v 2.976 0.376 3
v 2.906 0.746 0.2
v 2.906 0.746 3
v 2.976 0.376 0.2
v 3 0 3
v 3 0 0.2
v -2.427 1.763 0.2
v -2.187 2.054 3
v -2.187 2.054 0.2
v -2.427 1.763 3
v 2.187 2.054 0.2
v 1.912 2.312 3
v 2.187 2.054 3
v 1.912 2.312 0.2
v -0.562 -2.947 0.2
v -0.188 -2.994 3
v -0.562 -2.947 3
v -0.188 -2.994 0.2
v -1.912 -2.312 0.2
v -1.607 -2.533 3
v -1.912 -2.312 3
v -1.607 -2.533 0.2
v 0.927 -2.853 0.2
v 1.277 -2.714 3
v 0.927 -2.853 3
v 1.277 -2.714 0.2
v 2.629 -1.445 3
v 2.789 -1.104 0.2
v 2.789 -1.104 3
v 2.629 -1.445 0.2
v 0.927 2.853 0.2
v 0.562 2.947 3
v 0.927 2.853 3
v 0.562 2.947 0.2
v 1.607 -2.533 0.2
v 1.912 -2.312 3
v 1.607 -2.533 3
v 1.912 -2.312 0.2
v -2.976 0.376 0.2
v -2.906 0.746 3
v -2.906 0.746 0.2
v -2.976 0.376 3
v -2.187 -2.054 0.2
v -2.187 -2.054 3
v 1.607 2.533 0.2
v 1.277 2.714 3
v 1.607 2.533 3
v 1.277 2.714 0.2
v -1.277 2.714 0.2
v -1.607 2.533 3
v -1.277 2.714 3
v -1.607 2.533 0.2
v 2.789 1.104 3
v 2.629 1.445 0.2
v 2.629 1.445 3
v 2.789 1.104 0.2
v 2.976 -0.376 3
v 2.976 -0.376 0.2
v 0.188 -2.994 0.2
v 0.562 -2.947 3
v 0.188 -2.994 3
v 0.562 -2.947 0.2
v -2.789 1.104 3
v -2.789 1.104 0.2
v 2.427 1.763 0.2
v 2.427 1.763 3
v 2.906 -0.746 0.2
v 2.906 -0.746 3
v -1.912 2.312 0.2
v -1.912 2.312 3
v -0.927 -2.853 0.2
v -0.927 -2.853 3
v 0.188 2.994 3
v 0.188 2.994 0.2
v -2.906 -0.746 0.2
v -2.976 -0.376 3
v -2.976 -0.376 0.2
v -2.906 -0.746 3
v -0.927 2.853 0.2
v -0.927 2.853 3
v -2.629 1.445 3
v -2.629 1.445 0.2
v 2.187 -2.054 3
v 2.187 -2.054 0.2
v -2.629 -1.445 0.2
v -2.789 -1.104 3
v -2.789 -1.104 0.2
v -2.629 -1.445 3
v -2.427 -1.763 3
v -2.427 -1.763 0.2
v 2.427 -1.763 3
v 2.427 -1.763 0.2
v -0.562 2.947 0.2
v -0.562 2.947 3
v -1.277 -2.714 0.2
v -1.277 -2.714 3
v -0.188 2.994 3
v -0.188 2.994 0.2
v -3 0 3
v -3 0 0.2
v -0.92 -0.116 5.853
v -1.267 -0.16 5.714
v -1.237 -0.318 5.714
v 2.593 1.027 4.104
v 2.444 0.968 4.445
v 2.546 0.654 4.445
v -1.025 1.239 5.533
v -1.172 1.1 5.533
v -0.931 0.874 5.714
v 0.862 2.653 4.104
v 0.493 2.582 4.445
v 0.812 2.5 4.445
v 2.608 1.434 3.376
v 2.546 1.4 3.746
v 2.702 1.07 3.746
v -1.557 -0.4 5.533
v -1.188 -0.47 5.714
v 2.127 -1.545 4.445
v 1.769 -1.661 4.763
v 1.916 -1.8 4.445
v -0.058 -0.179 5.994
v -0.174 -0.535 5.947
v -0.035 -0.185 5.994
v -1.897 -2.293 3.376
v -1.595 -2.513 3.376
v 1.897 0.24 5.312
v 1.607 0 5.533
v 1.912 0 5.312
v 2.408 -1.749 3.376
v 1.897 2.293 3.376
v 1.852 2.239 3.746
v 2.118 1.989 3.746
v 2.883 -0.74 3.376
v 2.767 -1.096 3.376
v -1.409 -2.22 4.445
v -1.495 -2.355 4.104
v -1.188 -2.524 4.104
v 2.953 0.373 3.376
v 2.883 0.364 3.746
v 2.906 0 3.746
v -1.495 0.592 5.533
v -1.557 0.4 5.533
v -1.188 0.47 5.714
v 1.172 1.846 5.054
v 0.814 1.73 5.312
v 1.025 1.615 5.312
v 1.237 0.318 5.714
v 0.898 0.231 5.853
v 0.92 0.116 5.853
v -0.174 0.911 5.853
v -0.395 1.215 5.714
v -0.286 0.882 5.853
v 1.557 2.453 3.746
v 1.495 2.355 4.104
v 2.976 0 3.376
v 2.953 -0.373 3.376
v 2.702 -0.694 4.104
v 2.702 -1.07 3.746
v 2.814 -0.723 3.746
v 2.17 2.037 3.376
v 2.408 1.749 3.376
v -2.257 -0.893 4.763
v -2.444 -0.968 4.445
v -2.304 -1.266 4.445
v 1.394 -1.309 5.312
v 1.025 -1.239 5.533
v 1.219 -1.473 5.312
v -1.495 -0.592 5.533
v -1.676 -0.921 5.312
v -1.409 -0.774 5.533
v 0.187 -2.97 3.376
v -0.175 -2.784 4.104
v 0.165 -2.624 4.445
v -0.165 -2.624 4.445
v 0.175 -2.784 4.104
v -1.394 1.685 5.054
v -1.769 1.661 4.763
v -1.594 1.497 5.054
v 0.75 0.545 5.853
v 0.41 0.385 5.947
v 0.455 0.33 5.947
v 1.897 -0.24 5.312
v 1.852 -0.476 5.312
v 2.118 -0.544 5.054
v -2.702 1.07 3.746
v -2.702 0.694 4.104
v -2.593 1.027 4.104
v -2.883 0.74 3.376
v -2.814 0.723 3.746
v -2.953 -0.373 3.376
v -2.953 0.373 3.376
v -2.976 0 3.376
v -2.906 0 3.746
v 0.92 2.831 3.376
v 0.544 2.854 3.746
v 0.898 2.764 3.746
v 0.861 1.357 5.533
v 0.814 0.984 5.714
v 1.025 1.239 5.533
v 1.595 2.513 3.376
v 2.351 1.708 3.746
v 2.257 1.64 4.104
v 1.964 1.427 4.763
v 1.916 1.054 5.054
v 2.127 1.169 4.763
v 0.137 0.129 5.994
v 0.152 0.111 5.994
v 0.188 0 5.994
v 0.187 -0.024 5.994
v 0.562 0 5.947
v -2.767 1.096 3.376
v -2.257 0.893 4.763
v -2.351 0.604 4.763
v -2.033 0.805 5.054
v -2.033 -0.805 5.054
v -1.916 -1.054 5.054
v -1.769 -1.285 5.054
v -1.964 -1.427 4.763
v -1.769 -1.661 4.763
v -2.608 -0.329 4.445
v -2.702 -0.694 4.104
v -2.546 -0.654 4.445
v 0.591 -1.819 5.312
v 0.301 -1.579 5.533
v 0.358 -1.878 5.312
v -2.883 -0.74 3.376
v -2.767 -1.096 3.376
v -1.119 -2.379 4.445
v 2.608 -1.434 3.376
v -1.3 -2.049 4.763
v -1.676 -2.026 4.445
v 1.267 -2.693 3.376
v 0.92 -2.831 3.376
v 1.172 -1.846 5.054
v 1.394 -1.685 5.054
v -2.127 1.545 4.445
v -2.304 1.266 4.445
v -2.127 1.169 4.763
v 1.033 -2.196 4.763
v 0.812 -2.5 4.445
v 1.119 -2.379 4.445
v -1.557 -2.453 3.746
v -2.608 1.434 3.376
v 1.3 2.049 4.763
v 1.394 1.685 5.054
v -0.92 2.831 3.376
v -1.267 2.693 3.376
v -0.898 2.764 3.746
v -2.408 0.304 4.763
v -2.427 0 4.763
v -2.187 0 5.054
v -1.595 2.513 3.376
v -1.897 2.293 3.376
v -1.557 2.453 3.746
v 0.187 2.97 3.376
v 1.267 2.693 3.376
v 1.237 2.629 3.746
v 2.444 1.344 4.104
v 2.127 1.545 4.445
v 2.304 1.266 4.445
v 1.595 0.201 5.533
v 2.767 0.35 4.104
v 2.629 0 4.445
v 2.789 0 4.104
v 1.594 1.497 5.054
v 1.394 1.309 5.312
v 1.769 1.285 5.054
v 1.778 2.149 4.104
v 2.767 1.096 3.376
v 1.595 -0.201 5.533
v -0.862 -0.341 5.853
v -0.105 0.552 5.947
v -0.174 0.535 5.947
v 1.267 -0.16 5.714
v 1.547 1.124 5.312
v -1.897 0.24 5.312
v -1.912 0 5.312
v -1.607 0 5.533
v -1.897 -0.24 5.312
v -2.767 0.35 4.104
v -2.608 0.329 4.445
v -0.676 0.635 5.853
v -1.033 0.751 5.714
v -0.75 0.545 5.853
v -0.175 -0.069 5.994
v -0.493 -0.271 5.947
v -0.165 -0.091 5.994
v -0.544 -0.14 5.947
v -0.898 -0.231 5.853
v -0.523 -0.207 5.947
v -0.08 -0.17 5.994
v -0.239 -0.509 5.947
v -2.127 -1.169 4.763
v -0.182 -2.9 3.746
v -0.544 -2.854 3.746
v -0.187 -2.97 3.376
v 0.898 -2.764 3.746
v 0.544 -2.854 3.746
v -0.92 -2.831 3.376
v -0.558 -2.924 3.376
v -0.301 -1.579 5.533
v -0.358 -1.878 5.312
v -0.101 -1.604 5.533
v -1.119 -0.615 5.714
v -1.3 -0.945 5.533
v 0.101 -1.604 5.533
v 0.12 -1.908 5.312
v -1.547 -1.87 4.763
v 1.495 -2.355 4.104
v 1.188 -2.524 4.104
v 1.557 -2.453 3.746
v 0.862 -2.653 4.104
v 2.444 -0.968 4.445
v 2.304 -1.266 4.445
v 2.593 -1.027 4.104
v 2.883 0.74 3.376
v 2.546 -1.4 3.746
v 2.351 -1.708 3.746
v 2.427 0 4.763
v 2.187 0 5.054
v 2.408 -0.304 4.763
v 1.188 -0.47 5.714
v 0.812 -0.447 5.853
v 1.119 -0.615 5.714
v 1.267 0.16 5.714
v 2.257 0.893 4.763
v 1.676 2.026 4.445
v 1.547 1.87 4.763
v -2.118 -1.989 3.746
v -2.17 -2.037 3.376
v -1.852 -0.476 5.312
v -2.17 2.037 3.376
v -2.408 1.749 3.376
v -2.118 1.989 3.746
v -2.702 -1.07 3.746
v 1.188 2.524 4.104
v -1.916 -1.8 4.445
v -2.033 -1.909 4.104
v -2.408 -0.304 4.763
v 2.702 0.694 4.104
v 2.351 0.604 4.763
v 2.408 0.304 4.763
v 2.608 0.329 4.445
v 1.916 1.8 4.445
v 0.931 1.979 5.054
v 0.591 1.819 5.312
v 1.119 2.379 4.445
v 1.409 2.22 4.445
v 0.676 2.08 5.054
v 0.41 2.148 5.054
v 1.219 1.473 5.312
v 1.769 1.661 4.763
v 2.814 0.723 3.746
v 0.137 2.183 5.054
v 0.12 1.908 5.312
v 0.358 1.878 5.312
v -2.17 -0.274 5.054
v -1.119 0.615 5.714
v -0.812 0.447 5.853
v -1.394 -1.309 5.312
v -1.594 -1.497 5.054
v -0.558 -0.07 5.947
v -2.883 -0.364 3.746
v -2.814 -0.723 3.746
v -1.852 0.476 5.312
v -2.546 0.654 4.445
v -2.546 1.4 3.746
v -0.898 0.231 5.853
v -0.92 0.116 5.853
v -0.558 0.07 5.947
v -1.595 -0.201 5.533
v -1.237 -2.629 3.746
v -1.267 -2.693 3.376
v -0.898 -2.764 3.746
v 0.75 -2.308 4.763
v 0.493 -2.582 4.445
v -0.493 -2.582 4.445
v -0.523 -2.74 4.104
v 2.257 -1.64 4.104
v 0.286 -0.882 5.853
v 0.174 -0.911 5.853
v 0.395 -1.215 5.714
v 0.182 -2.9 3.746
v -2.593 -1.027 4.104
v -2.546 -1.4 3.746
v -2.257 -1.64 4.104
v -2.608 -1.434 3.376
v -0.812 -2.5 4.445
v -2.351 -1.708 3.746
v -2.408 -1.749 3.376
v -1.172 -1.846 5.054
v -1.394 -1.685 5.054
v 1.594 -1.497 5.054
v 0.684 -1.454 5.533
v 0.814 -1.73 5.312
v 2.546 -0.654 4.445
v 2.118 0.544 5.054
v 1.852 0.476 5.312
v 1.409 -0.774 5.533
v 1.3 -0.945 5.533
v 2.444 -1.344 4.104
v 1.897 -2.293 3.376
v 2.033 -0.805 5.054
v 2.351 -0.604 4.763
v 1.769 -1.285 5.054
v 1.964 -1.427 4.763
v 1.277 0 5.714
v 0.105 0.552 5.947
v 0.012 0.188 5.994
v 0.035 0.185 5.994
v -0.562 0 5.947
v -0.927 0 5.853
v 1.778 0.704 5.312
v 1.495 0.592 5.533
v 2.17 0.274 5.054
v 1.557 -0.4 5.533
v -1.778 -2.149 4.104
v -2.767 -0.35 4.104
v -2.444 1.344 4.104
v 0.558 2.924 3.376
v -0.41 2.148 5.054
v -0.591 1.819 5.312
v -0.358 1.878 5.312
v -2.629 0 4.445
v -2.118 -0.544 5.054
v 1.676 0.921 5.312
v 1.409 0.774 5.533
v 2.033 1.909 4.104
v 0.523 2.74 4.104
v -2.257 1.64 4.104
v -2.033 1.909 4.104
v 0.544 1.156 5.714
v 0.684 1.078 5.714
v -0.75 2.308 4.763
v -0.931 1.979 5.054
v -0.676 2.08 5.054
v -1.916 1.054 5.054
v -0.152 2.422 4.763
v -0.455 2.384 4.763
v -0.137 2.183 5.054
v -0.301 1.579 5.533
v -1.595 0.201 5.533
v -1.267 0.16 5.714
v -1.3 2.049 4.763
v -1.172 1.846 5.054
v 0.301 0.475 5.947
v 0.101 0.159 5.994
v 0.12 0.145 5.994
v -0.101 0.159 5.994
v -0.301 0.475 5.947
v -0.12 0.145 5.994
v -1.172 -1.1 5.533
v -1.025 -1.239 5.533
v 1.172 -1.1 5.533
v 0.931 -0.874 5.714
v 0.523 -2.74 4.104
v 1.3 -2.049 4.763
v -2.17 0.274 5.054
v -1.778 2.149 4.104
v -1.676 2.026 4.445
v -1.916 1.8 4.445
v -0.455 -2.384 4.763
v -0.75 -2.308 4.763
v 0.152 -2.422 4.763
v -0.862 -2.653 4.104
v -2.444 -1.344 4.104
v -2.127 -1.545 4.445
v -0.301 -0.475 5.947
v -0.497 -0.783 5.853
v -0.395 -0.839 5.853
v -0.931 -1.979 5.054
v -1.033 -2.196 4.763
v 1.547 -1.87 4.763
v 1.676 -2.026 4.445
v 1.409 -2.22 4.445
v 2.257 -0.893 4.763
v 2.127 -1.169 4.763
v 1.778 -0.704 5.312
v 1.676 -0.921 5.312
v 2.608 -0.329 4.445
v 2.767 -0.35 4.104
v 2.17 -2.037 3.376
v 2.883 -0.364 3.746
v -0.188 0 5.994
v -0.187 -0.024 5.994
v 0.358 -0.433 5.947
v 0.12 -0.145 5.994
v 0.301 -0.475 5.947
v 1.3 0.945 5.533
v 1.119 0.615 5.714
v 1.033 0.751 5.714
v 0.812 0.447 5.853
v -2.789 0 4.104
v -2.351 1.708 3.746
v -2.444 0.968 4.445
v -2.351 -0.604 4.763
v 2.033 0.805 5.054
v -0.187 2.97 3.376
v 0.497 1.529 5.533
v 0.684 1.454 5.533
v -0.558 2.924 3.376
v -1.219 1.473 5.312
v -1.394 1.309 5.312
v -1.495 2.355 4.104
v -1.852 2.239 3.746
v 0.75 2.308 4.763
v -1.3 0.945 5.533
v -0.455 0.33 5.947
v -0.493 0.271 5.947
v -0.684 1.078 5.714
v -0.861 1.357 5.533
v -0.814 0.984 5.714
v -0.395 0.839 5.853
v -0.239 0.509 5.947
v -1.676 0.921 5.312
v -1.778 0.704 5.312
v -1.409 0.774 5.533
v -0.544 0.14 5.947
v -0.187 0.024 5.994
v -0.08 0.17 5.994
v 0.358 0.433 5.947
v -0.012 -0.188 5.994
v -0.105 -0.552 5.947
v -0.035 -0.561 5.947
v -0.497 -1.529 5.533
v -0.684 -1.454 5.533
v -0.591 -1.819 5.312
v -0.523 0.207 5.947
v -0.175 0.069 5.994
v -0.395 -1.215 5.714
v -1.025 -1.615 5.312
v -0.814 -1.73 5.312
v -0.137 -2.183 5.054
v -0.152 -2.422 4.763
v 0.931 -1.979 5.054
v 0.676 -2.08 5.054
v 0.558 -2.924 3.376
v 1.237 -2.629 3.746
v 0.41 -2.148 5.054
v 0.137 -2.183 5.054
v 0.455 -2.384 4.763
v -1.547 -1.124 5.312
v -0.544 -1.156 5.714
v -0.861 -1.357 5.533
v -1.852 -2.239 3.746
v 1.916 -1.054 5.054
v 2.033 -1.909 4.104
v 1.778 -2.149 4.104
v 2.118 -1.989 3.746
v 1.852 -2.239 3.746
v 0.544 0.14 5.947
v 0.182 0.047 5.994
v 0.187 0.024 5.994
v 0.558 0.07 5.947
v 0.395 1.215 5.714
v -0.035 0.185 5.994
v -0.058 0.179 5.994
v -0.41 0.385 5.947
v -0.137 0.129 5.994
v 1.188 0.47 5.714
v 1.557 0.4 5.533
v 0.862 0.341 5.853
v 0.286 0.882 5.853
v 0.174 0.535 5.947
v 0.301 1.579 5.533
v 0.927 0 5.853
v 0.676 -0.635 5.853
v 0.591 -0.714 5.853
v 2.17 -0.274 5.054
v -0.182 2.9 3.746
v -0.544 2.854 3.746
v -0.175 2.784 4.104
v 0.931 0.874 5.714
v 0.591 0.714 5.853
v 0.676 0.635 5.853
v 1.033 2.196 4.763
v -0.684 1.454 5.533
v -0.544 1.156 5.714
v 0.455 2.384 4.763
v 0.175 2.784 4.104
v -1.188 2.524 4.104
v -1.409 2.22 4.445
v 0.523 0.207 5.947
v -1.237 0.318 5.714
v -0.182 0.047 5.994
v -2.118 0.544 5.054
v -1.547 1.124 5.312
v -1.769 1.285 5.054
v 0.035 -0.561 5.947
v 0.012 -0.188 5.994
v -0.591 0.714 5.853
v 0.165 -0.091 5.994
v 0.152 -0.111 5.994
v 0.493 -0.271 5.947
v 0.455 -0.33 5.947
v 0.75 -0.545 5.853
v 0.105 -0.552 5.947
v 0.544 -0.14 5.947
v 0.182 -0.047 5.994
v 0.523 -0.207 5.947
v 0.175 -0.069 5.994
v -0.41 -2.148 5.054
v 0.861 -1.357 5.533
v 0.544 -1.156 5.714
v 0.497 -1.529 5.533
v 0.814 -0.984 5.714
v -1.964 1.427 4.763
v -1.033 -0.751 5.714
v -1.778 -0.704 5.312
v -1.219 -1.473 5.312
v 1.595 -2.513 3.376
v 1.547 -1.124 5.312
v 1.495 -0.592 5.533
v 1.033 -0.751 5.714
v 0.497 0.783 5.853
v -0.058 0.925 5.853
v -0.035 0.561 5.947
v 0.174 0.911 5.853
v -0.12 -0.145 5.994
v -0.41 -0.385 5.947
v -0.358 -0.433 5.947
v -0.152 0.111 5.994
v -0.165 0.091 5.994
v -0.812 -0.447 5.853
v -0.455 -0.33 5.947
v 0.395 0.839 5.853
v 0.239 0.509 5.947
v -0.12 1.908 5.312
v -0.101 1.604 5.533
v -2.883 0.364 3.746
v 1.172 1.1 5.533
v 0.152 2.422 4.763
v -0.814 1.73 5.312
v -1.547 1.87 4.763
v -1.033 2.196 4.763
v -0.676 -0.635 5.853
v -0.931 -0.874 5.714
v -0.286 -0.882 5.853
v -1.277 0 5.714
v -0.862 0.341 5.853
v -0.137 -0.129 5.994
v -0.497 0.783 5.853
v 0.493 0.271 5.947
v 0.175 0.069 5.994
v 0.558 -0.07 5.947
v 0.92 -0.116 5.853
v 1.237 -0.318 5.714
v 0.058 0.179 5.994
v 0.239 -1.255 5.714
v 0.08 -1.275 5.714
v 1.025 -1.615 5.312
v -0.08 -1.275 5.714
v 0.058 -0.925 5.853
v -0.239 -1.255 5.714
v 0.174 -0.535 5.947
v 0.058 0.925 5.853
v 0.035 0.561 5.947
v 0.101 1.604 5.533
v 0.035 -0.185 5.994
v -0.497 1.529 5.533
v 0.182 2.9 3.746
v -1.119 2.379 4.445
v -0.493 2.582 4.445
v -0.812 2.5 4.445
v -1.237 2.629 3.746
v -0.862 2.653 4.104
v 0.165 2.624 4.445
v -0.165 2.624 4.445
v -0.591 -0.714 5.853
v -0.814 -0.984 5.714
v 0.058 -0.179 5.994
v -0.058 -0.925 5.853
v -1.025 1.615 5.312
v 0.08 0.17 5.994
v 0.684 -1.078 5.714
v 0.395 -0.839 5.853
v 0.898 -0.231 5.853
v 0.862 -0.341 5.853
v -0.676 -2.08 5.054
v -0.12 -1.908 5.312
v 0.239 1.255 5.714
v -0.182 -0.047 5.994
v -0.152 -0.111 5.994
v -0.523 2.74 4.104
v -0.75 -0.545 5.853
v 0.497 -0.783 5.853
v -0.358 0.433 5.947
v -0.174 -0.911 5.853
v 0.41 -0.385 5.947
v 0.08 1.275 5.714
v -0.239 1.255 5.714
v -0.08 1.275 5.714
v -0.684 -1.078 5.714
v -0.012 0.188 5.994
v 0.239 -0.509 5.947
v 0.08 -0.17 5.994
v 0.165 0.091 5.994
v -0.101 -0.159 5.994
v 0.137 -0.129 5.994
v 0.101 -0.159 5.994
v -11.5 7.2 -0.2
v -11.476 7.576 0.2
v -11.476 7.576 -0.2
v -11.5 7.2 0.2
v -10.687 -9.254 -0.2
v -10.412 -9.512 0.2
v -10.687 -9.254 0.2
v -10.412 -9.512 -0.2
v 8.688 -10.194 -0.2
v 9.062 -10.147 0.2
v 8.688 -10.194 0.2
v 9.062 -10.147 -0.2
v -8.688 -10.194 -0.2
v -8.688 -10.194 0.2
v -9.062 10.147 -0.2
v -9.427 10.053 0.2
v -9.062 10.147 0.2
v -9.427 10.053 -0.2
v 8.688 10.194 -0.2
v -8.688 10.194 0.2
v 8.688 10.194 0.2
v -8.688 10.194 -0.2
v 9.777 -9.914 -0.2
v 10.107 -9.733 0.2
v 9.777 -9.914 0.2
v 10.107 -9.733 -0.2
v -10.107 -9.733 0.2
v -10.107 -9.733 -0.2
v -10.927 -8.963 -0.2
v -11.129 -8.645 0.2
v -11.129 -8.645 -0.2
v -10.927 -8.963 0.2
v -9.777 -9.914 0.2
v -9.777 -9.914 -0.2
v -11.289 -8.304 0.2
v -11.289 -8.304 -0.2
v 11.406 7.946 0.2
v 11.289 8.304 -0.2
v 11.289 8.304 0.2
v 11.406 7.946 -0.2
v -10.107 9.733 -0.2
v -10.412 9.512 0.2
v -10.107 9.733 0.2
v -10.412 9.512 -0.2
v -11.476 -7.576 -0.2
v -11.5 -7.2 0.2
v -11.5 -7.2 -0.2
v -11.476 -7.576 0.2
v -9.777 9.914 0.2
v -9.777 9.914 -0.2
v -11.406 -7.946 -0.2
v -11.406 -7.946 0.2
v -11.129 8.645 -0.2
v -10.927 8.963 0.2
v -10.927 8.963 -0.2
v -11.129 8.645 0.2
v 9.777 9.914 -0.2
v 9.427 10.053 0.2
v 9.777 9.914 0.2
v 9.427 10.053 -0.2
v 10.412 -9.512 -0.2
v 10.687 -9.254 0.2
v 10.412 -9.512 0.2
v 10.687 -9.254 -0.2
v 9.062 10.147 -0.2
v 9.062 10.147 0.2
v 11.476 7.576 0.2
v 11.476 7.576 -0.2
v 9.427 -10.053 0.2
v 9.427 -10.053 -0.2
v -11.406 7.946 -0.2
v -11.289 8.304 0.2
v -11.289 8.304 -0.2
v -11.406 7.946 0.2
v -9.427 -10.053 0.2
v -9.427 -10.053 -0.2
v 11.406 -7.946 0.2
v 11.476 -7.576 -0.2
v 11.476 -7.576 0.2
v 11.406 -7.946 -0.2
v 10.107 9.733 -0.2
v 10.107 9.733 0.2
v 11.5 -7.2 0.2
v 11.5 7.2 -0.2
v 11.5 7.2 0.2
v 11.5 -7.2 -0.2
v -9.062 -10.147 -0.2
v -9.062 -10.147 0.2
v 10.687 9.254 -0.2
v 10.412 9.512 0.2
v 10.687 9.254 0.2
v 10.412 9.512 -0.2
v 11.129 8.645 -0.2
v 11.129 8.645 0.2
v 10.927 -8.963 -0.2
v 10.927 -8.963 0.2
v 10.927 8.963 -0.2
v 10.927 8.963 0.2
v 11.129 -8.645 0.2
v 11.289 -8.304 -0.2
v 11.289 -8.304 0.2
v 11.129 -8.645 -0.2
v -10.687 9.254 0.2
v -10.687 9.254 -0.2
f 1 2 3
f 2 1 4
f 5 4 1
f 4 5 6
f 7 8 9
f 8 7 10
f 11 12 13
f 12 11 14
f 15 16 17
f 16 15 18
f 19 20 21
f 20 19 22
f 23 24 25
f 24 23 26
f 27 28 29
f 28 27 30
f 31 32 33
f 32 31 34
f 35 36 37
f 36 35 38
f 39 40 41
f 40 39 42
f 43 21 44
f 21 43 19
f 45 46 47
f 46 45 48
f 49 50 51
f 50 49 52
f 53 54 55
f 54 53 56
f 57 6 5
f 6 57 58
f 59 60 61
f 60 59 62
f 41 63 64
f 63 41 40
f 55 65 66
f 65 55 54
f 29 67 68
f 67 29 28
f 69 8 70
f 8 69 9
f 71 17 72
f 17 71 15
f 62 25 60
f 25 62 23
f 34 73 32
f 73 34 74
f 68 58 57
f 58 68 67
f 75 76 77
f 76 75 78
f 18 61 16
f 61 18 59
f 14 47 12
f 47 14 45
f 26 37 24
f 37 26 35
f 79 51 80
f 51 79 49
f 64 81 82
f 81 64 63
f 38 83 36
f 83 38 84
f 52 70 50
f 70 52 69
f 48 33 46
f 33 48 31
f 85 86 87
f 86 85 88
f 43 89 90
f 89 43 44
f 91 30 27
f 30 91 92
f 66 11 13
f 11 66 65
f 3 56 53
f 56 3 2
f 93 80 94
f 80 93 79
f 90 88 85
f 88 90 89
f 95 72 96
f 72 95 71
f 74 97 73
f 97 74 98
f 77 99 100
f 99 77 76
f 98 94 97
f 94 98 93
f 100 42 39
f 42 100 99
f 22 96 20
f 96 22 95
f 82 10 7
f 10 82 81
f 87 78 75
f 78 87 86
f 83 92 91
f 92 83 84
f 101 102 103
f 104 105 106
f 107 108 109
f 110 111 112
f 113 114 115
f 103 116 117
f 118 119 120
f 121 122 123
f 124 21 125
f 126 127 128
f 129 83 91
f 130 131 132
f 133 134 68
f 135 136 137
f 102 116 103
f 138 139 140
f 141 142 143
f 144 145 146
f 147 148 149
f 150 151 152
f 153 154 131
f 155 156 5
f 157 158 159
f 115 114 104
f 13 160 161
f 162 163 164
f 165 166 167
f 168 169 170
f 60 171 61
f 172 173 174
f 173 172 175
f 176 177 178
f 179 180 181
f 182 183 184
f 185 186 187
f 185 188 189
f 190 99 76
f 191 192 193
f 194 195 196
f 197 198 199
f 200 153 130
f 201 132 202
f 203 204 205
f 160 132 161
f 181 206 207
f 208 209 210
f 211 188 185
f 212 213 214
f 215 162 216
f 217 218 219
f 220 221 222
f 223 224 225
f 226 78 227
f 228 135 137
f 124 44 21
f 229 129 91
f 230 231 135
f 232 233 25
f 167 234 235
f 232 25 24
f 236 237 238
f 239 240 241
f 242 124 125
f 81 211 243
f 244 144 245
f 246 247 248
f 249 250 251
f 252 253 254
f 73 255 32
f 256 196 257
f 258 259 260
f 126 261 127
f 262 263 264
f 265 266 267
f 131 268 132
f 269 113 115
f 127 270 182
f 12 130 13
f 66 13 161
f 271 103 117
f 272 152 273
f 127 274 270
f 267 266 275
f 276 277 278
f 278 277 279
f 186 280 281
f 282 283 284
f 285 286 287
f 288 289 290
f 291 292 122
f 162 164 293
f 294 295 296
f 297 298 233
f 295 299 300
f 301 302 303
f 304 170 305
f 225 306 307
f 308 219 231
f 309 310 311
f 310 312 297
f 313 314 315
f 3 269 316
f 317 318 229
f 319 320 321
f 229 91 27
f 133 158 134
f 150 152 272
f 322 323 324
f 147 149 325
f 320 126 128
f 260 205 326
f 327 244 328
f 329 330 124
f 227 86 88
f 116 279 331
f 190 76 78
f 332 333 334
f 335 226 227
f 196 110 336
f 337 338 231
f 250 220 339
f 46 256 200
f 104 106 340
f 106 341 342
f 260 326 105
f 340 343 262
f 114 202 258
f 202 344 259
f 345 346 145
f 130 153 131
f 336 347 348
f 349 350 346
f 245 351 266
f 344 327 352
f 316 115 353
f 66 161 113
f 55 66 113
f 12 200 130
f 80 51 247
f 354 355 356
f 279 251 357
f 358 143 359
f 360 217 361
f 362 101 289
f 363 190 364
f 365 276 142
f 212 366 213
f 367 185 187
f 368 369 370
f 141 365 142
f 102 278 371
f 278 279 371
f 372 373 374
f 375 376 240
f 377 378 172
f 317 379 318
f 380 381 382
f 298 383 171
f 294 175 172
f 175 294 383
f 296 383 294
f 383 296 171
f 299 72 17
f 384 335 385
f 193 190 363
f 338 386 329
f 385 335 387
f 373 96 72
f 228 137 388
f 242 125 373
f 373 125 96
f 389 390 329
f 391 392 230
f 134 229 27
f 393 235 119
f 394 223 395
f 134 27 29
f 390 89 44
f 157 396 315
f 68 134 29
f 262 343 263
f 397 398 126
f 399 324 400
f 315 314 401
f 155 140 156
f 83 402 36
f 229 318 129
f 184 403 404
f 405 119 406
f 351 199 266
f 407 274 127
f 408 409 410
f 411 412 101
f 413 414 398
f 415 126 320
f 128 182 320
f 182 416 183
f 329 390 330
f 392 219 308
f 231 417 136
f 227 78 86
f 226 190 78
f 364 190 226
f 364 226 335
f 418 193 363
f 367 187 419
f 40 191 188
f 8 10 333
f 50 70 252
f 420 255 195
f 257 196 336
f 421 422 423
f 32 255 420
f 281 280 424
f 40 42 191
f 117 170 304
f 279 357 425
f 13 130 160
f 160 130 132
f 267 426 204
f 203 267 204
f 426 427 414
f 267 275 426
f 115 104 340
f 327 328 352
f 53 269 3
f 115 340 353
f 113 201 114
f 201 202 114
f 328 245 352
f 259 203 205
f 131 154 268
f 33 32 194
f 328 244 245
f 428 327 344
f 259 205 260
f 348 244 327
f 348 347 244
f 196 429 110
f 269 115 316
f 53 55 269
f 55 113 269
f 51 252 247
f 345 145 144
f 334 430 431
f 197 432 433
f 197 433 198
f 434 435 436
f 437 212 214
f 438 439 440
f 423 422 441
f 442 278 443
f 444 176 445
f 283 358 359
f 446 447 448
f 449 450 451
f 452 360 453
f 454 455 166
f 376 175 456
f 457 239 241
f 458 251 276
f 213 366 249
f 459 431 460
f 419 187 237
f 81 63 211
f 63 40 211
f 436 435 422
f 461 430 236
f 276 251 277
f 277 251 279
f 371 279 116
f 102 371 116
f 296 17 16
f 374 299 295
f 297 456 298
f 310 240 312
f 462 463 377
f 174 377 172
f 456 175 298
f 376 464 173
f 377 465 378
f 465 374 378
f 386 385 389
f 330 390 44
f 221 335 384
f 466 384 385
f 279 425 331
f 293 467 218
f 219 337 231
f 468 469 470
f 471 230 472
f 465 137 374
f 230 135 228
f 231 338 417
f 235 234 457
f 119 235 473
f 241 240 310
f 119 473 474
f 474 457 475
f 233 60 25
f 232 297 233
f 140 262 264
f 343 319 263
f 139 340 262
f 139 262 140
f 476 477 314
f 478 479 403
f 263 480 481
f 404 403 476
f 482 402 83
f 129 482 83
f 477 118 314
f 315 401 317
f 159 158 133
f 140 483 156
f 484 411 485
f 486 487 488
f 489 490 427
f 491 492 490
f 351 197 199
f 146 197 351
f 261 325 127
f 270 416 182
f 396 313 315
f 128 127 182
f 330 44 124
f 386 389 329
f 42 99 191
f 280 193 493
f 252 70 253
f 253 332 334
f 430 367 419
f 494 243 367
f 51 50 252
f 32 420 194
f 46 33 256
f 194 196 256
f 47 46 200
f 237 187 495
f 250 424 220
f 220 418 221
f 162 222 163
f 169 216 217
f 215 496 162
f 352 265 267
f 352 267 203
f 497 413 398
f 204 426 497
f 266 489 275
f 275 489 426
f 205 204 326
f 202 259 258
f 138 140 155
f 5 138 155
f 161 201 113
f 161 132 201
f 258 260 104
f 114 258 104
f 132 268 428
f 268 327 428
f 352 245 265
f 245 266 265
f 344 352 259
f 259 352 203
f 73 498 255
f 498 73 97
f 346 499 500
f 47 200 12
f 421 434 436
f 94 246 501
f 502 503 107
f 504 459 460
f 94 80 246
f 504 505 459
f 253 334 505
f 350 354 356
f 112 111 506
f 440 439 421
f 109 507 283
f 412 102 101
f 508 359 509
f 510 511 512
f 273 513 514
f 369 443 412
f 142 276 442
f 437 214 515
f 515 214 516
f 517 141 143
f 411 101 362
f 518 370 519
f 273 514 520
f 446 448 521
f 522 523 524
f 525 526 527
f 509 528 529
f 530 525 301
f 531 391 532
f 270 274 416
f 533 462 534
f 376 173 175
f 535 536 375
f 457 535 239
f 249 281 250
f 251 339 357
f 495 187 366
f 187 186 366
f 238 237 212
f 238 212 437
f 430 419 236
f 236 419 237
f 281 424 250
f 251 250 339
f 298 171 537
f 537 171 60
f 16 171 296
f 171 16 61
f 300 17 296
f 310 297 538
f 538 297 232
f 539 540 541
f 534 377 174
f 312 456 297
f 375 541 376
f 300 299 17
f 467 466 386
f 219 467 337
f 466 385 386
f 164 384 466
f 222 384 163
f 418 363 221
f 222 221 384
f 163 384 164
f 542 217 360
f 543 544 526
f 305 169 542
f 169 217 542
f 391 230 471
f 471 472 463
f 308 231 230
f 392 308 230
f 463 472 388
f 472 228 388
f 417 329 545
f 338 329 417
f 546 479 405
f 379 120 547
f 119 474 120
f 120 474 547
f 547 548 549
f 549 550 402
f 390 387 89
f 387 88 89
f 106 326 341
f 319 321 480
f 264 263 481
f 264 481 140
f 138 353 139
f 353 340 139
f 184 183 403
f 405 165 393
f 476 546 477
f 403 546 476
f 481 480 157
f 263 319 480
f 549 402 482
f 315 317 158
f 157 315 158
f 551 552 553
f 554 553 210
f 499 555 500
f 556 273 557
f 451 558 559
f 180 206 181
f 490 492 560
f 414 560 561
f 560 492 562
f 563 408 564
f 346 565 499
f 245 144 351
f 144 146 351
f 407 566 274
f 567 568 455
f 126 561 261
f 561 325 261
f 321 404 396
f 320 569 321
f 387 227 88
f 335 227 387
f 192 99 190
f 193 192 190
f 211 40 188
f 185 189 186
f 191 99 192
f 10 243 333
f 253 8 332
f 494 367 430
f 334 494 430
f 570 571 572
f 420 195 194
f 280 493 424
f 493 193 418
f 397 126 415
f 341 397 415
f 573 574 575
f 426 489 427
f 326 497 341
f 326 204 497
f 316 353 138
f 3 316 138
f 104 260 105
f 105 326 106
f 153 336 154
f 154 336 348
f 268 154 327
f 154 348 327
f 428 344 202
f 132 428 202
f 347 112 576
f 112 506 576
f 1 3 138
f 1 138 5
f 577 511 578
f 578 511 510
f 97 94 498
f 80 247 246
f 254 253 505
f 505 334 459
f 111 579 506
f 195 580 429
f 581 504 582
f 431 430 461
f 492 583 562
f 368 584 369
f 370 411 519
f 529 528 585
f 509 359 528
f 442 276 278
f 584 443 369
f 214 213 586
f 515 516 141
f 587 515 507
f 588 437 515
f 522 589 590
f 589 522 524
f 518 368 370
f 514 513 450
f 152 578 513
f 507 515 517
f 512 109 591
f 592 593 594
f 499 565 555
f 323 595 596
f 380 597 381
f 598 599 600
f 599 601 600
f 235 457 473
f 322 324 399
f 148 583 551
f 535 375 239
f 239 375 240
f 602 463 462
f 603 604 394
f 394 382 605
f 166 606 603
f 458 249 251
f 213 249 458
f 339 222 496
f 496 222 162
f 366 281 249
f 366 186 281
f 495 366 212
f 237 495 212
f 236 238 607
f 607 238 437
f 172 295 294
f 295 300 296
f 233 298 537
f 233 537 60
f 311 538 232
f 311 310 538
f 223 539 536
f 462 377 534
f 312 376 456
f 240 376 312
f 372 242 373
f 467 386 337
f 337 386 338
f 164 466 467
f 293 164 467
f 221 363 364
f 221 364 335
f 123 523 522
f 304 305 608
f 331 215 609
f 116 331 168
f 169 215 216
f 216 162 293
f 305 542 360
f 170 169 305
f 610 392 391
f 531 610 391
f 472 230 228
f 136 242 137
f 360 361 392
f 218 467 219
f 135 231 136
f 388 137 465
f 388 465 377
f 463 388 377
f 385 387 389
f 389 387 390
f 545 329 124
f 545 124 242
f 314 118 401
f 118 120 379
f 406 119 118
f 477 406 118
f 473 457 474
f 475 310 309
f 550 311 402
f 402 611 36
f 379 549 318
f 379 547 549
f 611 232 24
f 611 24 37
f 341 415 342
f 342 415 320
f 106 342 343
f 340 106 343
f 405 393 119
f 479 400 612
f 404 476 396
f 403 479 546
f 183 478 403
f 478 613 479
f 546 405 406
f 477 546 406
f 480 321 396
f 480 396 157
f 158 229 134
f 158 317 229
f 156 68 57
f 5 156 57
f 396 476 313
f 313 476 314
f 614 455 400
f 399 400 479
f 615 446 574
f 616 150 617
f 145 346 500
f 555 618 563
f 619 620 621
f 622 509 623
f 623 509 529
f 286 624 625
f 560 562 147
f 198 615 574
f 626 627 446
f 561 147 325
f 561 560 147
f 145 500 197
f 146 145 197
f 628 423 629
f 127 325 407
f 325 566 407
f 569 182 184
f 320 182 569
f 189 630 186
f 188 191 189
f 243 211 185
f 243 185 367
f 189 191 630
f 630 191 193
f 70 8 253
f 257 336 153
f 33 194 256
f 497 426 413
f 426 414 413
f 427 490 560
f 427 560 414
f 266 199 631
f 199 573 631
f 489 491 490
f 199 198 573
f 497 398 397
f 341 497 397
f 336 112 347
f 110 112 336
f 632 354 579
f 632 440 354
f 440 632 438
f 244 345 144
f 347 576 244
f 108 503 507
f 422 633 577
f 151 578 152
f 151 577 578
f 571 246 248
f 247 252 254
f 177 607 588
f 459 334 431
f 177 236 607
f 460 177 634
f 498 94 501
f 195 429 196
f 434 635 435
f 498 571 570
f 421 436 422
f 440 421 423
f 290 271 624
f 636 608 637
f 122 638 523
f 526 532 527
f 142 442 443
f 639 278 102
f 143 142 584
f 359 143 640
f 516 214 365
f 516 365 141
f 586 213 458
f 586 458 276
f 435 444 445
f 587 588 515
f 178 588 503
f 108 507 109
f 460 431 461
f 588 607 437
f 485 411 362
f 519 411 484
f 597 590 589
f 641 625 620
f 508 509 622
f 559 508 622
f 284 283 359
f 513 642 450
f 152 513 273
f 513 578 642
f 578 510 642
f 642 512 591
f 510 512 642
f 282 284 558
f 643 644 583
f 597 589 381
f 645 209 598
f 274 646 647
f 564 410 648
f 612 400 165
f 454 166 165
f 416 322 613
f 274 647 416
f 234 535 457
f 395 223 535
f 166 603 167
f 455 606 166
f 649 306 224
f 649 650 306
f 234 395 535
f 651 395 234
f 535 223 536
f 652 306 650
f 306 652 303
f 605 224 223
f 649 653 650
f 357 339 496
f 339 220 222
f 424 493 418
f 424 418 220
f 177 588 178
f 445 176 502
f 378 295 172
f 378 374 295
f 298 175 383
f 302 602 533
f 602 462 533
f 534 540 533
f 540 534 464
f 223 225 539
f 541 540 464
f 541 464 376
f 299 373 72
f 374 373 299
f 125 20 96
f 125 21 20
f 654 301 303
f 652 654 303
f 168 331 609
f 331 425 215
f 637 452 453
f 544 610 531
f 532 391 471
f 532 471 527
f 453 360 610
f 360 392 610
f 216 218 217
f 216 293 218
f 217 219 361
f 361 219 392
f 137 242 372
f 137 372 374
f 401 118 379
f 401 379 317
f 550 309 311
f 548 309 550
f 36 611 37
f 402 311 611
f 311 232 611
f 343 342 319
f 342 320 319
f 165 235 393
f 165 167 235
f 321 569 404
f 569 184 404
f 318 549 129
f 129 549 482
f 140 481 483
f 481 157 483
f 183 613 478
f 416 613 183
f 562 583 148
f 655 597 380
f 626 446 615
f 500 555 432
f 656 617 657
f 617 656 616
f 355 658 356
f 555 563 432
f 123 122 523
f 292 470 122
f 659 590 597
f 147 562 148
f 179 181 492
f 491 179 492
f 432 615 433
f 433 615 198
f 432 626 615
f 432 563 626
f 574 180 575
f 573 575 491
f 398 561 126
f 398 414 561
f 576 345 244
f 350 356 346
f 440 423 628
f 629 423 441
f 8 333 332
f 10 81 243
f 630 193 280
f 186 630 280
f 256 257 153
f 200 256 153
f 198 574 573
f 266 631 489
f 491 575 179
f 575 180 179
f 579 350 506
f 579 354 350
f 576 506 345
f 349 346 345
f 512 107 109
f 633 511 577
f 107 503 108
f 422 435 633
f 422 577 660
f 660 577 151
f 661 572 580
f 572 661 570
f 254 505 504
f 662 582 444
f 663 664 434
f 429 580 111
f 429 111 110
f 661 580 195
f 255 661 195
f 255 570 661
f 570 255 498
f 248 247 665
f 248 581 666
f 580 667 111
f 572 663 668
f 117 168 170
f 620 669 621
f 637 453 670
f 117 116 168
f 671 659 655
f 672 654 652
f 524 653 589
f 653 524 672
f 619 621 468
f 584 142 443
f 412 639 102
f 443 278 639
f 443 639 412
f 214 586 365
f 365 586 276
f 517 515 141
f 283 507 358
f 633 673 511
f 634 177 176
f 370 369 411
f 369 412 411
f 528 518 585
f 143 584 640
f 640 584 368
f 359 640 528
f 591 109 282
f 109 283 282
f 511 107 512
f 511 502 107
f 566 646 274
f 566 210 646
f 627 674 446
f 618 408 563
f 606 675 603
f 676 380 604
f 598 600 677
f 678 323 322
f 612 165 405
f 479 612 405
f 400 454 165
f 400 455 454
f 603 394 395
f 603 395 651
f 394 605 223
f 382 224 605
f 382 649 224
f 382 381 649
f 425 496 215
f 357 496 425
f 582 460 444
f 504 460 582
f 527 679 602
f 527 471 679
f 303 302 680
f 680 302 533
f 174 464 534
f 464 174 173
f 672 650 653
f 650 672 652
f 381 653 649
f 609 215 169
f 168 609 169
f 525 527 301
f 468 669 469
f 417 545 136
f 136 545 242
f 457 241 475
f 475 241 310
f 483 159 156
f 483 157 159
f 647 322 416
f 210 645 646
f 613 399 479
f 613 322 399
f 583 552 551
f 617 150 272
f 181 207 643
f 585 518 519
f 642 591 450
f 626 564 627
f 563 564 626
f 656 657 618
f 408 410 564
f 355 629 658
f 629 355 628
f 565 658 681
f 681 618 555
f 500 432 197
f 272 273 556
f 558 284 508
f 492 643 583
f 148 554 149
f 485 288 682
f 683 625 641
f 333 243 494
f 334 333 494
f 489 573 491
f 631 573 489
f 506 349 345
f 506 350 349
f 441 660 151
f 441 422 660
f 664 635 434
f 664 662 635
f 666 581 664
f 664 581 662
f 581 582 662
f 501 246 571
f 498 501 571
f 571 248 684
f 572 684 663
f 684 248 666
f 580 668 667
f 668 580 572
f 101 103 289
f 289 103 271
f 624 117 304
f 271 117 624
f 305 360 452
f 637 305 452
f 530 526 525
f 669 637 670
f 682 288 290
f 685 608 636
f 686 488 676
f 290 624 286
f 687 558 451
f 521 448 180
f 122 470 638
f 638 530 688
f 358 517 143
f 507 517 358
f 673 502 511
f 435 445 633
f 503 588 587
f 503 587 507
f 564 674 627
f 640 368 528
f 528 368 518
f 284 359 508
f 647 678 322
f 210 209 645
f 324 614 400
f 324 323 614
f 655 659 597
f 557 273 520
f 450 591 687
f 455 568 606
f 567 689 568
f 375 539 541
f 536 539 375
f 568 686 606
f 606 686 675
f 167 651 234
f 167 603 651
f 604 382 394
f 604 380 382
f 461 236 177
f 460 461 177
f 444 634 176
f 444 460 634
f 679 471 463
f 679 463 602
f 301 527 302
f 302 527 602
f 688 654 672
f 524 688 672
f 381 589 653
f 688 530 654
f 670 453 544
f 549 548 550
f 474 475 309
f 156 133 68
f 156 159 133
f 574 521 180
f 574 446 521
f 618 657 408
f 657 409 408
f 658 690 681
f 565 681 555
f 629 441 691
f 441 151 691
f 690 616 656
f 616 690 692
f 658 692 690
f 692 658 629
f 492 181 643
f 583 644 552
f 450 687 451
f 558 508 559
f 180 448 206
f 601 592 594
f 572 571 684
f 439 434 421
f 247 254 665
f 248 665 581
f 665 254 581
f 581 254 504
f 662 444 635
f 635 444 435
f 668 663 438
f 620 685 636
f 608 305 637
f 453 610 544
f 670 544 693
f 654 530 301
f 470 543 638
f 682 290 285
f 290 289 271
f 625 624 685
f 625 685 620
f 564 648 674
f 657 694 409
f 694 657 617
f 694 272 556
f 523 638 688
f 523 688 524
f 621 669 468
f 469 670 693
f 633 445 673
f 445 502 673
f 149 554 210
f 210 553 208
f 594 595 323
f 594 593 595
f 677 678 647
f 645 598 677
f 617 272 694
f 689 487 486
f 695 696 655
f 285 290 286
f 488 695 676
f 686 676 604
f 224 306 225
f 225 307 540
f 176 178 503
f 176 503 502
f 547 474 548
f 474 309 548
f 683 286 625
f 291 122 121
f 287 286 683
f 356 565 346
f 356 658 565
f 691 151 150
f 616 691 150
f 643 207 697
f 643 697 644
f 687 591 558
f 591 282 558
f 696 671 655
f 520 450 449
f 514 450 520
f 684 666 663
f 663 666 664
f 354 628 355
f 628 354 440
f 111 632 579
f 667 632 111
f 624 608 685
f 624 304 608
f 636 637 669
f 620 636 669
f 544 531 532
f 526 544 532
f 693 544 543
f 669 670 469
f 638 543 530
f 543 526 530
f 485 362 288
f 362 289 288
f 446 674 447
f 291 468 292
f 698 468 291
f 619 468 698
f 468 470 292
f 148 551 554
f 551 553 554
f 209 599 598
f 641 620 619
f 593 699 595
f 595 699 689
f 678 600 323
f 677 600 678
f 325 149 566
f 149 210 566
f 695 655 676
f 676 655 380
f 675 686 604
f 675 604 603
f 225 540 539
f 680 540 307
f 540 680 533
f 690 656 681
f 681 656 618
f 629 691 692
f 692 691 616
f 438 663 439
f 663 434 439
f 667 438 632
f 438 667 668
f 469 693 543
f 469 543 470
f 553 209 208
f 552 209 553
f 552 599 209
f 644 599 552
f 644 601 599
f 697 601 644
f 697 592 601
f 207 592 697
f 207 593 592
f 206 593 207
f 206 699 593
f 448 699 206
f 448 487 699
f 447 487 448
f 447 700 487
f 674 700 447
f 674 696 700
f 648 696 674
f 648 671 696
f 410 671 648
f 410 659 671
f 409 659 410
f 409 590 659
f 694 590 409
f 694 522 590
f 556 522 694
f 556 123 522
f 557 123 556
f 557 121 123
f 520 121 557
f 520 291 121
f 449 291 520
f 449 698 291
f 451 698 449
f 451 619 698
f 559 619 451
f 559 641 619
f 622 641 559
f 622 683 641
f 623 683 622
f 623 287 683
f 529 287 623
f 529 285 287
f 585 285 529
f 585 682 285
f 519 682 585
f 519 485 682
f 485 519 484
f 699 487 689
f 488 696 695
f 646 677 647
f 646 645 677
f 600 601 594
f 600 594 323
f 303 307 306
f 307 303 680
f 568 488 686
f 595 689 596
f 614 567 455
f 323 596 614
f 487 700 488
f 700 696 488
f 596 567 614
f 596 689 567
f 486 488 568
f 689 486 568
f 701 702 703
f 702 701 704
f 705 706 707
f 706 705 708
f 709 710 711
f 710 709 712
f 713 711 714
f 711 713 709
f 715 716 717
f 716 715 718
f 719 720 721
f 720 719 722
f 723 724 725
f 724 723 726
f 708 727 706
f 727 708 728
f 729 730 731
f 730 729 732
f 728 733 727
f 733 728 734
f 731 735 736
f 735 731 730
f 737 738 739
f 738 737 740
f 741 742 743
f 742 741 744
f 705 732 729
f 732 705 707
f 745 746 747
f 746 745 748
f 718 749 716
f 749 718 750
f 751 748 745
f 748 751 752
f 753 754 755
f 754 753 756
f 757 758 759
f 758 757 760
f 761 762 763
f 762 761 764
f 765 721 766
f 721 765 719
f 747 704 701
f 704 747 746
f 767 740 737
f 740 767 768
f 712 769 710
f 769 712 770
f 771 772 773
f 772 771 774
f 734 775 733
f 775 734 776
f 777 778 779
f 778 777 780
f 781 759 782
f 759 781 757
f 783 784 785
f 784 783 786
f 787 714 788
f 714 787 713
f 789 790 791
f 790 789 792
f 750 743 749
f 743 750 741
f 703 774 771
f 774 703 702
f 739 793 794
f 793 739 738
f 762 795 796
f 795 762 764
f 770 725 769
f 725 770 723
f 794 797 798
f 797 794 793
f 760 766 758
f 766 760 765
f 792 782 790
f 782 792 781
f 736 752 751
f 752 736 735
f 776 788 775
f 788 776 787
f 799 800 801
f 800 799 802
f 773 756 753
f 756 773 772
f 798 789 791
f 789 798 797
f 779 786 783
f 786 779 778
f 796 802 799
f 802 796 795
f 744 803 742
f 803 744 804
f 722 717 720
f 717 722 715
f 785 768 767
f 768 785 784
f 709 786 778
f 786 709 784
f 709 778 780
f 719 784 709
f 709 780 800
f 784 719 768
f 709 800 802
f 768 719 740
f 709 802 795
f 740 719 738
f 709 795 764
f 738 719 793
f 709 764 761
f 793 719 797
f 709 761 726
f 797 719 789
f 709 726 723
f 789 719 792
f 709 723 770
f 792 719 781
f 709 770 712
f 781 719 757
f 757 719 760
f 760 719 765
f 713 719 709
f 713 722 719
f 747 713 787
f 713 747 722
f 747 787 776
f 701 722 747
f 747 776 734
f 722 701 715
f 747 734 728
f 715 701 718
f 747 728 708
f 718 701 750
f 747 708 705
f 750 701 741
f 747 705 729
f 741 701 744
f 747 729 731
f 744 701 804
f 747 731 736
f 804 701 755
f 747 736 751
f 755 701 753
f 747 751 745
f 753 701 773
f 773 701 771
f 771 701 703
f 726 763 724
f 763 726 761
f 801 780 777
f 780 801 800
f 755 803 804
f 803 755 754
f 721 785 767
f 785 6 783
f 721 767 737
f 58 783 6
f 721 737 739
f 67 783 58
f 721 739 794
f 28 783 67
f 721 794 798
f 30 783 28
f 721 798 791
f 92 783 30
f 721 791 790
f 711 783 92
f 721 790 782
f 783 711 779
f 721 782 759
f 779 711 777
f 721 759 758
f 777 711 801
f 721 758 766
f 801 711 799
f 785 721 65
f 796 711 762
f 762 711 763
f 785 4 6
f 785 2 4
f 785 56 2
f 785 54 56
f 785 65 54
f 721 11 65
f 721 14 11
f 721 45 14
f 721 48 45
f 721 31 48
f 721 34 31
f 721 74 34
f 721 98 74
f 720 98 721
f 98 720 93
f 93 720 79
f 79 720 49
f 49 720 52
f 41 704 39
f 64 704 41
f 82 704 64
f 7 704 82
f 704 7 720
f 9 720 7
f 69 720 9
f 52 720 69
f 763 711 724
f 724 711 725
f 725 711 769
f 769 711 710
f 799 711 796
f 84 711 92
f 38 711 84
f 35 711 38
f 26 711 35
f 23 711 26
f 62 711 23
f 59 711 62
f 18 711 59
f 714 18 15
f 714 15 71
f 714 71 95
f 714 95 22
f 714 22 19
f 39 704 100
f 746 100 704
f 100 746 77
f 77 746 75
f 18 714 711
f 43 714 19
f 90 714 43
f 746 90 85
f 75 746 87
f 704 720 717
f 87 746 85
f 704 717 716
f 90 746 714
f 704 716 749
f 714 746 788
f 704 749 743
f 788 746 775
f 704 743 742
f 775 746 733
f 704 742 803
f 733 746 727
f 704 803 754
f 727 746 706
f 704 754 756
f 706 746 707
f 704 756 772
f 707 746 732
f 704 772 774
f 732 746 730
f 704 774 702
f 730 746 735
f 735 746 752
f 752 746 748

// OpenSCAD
$fn=50;

sliderX=23;
sliderY=20.4;
sliderZ=0.4;
sliderZpos=0;
radius=3;

knobRadius=3;
knobHeight=3;


slider();


module slider(){
    base();
    knob();
}

module base(){
    hull()
    {
        translate([-sliderX/2+radius,-sliderY/2+radius,sliderZpos])
        cylinder(h=sliderZ,r=radius,center=true);
        translate([sliderX/2-radius,-sliderY/2+radius,sliderZpos])
        cylinder(h=sliderZ,r=radius,center=true);
        translate([-sliderX/2+radius,sliderY/2-radius,sliderZpos])
        cylinder(h=sliderZ,r=radius,center=true);
        translate([sliderX/2-radius,sliderY/2-radius,sliderZpos])
        cylinder(h=sliderZ,r=radius,center=true);
    }
}

module knob(){
    translate([0,0,knobHeight/2])
    cylinder(h=knobHeight,r=knobRadius,center=true);

    translate([0,0,knobHeight])
    sphere(r=radius);
}
